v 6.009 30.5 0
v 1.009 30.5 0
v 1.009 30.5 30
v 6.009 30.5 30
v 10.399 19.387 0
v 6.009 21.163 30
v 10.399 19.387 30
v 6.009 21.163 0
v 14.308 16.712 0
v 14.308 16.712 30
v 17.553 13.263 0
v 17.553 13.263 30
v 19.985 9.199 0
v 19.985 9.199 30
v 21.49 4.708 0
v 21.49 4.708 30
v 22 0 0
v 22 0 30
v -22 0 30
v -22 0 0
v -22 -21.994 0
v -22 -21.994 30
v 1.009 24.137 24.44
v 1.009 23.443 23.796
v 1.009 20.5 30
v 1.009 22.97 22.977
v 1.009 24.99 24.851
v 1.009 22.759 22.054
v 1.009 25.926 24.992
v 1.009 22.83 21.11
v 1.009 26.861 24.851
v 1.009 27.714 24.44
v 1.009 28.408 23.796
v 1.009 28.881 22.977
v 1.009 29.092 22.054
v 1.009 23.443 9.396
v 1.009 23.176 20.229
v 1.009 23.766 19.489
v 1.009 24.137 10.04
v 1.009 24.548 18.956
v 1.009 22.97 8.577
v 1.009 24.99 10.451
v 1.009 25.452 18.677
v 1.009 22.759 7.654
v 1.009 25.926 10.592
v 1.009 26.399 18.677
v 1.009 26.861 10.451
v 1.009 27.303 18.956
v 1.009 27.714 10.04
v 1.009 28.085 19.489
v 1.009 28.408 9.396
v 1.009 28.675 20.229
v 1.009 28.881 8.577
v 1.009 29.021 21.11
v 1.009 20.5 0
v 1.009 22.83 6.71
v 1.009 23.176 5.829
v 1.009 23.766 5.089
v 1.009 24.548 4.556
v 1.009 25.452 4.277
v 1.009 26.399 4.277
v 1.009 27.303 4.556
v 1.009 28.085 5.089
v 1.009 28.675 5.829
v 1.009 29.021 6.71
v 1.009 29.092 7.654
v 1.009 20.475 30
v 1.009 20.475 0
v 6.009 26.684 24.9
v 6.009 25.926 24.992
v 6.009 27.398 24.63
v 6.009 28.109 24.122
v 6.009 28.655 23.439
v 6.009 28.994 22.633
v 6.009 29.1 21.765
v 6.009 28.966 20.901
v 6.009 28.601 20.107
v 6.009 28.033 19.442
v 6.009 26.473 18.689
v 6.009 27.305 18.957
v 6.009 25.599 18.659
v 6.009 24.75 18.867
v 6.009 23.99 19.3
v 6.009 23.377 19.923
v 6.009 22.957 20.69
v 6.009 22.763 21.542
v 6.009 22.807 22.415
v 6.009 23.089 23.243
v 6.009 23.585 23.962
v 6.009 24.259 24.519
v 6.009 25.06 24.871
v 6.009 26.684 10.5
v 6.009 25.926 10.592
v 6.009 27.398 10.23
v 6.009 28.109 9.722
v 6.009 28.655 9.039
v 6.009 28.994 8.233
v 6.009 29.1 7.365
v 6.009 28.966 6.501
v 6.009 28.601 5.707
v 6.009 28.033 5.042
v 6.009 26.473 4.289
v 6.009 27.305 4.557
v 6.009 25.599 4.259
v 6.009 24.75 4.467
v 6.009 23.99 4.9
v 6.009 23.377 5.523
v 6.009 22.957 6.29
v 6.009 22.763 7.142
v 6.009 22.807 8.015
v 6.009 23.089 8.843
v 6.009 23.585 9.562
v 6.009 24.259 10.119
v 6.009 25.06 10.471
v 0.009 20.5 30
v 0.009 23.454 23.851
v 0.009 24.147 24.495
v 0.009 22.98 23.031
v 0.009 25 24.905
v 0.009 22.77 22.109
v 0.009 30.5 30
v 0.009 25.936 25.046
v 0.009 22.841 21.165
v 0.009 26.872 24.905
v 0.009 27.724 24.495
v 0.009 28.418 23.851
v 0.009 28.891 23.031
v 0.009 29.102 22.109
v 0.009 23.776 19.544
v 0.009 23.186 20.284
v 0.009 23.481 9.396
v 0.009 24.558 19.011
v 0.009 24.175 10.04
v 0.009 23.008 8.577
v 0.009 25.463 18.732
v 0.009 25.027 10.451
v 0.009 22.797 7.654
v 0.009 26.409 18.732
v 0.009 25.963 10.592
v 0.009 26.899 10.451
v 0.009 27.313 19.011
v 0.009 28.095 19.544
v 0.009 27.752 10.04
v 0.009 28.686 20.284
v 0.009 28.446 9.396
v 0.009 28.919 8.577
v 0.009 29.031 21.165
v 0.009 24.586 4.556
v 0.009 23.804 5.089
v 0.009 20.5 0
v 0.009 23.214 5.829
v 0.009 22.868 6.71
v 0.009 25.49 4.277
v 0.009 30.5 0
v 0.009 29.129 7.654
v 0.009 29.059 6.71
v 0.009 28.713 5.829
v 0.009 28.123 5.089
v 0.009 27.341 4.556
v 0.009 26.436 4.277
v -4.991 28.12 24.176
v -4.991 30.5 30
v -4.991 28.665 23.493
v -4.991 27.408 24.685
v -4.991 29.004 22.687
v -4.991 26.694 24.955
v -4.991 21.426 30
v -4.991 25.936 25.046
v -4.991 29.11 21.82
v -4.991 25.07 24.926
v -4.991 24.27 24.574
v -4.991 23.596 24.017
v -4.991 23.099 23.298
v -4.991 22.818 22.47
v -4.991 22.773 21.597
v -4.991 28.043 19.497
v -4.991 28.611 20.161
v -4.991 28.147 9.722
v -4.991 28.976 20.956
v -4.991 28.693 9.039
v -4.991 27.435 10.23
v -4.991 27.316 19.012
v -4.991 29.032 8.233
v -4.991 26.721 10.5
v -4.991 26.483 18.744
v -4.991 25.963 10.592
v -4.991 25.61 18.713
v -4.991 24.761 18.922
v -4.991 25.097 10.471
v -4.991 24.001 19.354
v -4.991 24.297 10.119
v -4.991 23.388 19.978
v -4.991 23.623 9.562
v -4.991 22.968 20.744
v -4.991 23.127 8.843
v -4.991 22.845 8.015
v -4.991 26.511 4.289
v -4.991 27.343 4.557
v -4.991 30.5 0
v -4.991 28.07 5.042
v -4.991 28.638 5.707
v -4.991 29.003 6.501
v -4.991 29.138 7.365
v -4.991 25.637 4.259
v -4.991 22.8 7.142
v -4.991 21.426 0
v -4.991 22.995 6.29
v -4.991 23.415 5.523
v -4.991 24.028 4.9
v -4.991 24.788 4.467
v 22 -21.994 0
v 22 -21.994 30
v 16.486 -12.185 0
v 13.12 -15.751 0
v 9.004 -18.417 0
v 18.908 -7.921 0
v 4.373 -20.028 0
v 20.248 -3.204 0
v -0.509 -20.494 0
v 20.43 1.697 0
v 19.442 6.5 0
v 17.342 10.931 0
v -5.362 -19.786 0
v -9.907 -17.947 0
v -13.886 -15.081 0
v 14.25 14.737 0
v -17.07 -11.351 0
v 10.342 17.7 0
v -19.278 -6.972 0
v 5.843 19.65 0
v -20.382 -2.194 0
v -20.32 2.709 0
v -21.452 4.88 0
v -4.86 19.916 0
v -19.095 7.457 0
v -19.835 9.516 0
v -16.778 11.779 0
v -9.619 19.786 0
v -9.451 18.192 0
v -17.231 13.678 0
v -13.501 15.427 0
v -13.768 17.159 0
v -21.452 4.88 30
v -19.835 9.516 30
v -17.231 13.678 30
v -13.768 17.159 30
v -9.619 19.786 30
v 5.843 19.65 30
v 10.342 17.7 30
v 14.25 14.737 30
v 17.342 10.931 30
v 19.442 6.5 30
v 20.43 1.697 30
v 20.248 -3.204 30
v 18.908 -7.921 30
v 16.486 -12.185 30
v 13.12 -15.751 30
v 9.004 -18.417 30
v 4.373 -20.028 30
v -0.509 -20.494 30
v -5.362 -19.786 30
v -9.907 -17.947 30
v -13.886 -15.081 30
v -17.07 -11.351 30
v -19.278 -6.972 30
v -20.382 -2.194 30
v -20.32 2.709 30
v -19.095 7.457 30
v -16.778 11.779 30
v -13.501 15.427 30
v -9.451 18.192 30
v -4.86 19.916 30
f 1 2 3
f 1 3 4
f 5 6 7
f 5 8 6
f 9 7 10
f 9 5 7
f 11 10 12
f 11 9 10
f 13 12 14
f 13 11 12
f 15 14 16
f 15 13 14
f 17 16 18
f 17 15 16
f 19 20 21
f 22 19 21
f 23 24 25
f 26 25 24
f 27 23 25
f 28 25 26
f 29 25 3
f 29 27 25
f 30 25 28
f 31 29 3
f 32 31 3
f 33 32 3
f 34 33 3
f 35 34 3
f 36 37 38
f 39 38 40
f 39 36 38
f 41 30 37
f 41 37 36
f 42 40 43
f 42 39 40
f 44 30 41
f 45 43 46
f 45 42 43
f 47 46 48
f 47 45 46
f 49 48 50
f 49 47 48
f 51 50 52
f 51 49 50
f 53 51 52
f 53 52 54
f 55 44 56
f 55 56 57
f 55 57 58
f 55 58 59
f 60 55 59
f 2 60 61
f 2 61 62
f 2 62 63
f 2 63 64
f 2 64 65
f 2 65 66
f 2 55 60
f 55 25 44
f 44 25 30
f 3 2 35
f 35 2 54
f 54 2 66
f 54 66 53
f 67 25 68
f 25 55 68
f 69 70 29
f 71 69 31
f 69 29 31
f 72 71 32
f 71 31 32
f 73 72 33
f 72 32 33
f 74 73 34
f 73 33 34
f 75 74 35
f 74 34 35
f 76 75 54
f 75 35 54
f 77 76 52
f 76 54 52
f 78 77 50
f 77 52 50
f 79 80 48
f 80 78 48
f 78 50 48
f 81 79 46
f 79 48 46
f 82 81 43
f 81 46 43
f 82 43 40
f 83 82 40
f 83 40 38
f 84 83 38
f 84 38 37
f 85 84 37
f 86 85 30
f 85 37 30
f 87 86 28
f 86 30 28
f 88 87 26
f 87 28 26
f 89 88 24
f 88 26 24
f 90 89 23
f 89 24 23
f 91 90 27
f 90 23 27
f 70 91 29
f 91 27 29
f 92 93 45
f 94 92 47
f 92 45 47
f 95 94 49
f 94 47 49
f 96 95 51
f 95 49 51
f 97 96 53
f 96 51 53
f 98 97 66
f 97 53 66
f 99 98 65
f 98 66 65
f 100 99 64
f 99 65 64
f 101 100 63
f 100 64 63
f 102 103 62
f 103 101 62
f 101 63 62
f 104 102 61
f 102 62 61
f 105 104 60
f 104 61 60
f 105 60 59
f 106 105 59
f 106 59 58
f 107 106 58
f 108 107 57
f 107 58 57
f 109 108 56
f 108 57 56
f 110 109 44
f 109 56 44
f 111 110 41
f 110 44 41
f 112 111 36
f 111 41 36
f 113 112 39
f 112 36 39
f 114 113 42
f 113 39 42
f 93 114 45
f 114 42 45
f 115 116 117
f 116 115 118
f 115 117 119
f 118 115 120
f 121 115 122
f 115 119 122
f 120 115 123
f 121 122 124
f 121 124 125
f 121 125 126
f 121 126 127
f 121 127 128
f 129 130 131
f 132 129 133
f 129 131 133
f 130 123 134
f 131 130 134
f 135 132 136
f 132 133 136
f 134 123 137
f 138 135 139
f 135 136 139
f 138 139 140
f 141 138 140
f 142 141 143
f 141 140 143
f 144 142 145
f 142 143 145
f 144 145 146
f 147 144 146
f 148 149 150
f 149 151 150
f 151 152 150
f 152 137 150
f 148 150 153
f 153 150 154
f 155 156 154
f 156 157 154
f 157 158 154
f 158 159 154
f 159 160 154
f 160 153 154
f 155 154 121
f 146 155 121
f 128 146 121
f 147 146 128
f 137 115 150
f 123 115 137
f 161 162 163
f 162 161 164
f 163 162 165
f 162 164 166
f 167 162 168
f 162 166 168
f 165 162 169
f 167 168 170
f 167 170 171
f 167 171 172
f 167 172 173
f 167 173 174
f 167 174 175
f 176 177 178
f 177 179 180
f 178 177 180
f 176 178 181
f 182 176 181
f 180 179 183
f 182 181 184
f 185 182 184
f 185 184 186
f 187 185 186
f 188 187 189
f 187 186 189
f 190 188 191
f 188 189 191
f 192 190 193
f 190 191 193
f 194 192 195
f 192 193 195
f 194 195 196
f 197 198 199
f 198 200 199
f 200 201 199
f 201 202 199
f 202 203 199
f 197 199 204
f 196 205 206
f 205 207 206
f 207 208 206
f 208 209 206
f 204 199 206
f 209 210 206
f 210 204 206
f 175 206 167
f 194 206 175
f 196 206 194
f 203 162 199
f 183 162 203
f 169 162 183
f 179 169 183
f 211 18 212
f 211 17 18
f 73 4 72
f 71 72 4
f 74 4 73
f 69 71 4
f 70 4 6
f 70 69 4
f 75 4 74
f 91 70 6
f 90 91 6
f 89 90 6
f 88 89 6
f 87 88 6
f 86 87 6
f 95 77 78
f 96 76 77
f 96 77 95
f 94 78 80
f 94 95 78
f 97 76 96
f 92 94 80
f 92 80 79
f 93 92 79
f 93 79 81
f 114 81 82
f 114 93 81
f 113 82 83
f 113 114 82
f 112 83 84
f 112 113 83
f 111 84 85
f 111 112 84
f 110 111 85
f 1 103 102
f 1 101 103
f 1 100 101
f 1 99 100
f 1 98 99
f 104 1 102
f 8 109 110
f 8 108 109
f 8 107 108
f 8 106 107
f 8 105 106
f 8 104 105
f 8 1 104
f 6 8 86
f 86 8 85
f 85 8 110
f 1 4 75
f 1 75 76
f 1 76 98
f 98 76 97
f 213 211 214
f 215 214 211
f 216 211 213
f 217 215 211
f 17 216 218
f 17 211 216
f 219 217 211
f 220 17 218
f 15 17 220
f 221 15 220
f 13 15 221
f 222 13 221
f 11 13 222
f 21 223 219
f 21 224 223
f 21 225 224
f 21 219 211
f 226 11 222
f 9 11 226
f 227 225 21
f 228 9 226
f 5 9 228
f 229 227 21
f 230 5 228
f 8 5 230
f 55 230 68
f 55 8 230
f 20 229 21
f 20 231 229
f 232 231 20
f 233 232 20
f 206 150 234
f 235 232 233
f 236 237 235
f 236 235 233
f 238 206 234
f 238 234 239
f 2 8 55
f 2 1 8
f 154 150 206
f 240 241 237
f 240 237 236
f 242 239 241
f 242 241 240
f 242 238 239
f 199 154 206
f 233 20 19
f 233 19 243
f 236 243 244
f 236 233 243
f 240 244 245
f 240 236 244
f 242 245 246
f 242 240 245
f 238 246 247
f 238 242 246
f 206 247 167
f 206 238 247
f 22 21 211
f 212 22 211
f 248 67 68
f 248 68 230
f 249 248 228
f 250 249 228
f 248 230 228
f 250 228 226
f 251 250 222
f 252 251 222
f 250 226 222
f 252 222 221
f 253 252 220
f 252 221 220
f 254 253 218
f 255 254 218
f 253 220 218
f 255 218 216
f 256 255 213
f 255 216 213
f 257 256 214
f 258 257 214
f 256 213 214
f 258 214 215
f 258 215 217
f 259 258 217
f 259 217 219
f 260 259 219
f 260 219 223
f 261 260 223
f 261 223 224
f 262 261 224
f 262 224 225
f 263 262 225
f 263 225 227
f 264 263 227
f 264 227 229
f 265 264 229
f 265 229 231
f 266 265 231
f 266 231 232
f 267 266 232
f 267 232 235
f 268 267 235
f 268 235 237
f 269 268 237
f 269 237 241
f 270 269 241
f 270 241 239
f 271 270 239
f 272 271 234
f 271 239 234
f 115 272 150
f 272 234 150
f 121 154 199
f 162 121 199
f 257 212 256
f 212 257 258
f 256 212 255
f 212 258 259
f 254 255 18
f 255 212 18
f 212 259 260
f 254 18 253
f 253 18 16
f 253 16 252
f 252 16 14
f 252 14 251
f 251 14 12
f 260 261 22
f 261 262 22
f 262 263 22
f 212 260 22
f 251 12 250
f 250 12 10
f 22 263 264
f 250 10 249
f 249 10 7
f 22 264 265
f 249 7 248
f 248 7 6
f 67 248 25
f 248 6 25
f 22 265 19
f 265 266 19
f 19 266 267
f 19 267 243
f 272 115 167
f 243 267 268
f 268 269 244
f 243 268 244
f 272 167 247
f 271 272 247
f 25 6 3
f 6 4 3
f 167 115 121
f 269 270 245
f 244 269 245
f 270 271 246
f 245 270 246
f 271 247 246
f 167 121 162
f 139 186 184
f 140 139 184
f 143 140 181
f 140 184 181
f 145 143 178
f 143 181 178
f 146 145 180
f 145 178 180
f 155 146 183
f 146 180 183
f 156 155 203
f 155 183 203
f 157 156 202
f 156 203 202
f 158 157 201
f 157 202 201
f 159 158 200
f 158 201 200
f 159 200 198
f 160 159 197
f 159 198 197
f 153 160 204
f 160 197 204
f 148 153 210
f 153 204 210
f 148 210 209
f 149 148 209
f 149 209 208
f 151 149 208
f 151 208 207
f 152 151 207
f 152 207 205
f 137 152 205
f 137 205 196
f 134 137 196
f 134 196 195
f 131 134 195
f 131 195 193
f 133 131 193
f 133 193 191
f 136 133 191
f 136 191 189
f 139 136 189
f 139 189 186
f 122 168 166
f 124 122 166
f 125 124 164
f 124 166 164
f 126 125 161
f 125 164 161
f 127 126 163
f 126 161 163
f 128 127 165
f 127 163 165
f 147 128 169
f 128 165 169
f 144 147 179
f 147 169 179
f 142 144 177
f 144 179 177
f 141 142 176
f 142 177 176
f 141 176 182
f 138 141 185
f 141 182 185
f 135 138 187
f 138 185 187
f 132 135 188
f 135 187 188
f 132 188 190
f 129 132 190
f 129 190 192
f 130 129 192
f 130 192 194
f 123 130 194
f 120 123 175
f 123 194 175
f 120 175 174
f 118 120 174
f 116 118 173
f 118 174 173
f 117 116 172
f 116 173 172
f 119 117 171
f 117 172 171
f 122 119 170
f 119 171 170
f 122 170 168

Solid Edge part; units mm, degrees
sketch "Sketch1" plane through (0, 0, 0) normal (0, 0, 1) x (1, 0, 0)
  line L0 (6.0091, 30.5) -> (6.0091, 21.1635)
  line L1 (22.0001, 0) -> (22.0001, -21.9937)
  line L2 (-0.5256, -21.9937) -> (22.0001, -21.9937)
  line L3 (-0.5256, -21.9937) -> (-21.9999, -21.9937)
  line L4 (-21.9999, 0) -> (-21.9999, -21.9937)
  arc A0 (-21.9999, 0) -> (-4.9909, 21.4264) centre (0.0001, 0) cw
  line L5 (-4.9909, 30.5) -> (-4.9909, 21.4264)
  line L6 (0.0091, 30.5) -> (-4.9909, 30.5)
  line L7 (0.0091, 20.5) -> (0.0091, 30.5)
  line L8 (1.0091, 20.5) -> (1.0091, 20.4752)
  line L9 (1.0091, 20.5) -> (1.0091, 30.5)
  line L10 (1.0091, 30.5) -> (6.0091, 30.5)
  arc A1 (6.0091, 21.1635) -> (22.0001, 0) centre (0.0001, 0) cw
  arc A2 (1.0091, 20.4752) -> (0.0091, 20.5) centre (0.0001, 0) cw
extrude "Protrusion1" add sketch "Sketch1" along normal blind 30
hole "Hole_1" at (-4.9909, 25.9632, 7.4167) direction (1, 0, 0) diameter 6.35 end up to next
hole "Hole1" at (-4.9909, 25.9359, 21.8715) direction (1, 0, 0) diameter 6.35 end up to next
hole "Hole_3" at (1.0091, 25.9256, 7.4167) direction (1, 0, 0) diameter 6.35 end up to next
hole "Hole2" at (1.0091, 25.9256, 21.8167) direction (1, 0, 0) diameter 6.35 end up to next
